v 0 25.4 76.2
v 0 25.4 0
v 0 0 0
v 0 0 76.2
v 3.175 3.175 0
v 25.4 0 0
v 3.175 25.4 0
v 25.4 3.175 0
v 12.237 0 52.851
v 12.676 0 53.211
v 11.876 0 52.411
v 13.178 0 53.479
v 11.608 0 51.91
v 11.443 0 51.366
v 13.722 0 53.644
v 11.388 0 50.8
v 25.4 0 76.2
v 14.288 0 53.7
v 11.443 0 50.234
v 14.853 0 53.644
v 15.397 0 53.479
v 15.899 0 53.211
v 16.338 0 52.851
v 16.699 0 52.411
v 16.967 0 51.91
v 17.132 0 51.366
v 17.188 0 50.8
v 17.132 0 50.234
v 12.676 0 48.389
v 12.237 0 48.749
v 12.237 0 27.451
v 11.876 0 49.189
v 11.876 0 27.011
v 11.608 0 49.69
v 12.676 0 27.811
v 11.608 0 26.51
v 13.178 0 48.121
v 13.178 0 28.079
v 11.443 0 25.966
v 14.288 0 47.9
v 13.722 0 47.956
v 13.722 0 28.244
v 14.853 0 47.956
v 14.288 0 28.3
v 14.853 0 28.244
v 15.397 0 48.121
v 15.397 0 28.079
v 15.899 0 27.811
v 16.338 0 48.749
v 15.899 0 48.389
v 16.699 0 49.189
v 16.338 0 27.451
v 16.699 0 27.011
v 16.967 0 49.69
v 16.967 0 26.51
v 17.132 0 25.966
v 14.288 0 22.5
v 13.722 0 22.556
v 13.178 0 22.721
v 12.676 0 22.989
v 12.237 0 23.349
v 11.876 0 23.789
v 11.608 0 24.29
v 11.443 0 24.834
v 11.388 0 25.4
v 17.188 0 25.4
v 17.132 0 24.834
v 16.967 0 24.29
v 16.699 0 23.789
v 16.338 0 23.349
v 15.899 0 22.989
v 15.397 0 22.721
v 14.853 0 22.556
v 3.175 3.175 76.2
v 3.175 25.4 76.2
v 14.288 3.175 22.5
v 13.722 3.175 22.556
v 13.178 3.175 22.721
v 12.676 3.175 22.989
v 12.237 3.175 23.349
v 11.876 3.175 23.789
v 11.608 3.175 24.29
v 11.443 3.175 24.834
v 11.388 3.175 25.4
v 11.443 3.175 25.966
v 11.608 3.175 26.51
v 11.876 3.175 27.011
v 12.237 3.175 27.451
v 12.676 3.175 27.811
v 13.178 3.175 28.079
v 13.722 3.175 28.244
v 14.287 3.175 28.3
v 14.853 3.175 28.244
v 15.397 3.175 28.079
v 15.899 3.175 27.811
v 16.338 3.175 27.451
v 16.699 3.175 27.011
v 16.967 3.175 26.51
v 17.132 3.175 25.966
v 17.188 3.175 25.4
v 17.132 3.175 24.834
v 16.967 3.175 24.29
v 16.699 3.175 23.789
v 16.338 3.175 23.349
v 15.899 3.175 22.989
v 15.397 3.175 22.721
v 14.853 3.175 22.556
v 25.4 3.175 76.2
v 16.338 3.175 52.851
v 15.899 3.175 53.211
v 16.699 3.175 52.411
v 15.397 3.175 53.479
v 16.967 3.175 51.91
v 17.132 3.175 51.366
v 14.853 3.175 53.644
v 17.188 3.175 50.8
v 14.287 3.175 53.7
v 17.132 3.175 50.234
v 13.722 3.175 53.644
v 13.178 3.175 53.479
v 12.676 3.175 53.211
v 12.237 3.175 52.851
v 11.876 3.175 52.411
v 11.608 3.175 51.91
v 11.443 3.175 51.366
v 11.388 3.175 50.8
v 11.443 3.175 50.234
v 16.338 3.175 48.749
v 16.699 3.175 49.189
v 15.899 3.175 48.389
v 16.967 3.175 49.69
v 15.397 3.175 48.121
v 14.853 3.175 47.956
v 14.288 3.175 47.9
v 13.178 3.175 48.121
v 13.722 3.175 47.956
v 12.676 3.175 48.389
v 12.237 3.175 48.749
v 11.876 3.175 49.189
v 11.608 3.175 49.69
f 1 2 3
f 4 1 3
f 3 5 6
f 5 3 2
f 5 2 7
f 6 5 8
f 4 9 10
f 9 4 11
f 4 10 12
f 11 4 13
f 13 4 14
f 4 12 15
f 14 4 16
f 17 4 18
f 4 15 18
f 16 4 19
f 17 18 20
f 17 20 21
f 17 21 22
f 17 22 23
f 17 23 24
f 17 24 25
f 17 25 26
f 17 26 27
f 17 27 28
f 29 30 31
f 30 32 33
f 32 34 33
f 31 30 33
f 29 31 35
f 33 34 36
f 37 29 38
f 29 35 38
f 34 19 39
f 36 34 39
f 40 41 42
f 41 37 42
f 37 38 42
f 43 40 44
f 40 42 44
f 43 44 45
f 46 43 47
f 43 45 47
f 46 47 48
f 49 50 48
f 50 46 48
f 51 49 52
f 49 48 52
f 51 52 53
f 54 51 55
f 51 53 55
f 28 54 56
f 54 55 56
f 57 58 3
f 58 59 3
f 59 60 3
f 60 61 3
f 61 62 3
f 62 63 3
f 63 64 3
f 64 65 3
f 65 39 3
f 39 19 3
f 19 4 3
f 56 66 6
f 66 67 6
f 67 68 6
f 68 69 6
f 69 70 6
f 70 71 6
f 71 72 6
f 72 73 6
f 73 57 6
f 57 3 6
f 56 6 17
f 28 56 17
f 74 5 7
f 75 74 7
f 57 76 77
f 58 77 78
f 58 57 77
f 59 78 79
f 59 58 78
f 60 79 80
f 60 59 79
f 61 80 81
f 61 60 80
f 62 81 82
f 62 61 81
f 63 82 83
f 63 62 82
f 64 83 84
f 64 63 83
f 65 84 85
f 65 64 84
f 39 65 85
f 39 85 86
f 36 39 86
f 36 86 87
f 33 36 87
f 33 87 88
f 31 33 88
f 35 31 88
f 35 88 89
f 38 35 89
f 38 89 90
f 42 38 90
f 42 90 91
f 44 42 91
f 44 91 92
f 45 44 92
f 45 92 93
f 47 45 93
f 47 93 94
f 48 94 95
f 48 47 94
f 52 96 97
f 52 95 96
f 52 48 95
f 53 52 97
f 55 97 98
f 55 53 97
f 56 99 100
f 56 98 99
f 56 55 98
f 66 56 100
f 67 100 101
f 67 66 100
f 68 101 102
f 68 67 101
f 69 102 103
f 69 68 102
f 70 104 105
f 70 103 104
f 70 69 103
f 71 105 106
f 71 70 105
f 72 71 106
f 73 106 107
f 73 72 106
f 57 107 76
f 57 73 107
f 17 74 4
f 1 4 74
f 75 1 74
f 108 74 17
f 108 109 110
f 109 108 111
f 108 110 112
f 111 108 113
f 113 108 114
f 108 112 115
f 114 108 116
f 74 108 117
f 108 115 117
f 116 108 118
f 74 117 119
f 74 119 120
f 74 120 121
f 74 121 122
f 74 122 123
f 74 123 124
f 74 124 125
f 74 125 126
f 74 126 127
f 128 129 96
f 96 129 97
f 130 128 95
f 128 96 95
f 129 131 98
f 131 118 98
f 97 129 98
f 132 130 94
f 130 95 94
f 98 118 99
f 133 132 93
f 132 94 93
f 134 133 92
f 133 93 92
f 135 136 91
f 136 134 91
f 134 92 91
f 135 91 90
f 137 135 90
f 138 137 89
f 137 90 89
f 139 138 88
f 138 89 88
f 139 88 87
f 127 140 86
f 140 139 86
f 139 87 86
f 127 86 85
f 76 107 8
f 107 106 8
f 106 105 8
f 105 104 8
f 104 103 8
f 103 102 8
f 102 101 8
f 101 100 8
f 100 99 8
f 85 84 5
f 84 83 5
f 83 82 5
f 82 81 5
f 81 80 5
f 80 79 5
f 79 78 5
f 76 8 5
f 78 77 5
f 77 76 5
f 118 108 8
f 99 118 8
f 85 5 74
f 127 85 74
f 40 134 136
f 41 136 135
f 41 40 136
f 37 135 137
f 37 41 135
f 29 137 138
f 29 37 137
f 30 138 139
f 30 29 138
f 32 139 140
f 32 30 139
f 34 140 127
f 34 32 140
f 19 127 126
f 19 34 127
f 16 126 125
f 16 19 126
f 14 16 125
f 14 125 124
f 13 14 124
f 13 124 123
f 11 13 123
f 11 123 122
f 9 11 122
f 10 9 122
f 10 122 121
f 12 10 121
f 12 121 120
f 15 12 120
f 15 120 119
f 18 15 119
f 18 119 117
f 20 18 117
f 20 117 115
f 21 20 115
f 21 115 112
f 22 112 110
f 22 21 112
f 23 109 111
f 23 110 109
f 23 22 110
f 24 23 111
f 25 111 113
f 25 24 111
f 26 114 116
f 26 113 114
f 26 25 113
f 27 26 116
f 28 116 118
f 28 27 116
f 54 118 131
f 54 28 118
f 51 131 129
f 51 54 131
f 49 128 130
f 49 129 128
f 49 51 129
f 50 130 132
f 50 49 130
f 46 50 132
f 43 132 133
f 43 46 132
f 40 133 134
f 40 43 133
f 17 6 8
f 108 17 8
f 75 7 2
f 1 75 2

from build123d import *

# Parameters (mm, degrees)
BOSS_EXTRUDE1_DEPTH = 76.2
SKETCH2_R           = 2.9
CUT_EXTRUDE1_DEPTH  = 76.2


with BuildPart() as part:
    # Sketch1 → Boss-Extrude1 (new body)
    with BuildSketch(Plane.XY):
        Polygon((0, 0), (25.4, 0), (25.4, 3.175), (3.175, 3.175), (3.175, 25.4), (0, 25.4), align=None)
    extrude(amount=BOSS_EXTRUDE1_DEPTH)

    # Sketch2 → Cut-Extrude1 (cut)
    with BuildSketch(Plane(origin=(0, 0, 0), x_dir=(1, 0, 0), z_dir=(0, 1, 0))):
        with Locations(Location((14.2875, -25.4, 0), (0, 0, 90))):
            Circle(SKETCH2_R)
        with Locations(Location((14.2875, -50.8, 0), (0, 0, 90))):
            Circle(SKETCH2_R)
    extrude(amount=CUT_EXTRUDE1_DEPTH, mode=Mode.SUBTRACT)


solid = part.part
